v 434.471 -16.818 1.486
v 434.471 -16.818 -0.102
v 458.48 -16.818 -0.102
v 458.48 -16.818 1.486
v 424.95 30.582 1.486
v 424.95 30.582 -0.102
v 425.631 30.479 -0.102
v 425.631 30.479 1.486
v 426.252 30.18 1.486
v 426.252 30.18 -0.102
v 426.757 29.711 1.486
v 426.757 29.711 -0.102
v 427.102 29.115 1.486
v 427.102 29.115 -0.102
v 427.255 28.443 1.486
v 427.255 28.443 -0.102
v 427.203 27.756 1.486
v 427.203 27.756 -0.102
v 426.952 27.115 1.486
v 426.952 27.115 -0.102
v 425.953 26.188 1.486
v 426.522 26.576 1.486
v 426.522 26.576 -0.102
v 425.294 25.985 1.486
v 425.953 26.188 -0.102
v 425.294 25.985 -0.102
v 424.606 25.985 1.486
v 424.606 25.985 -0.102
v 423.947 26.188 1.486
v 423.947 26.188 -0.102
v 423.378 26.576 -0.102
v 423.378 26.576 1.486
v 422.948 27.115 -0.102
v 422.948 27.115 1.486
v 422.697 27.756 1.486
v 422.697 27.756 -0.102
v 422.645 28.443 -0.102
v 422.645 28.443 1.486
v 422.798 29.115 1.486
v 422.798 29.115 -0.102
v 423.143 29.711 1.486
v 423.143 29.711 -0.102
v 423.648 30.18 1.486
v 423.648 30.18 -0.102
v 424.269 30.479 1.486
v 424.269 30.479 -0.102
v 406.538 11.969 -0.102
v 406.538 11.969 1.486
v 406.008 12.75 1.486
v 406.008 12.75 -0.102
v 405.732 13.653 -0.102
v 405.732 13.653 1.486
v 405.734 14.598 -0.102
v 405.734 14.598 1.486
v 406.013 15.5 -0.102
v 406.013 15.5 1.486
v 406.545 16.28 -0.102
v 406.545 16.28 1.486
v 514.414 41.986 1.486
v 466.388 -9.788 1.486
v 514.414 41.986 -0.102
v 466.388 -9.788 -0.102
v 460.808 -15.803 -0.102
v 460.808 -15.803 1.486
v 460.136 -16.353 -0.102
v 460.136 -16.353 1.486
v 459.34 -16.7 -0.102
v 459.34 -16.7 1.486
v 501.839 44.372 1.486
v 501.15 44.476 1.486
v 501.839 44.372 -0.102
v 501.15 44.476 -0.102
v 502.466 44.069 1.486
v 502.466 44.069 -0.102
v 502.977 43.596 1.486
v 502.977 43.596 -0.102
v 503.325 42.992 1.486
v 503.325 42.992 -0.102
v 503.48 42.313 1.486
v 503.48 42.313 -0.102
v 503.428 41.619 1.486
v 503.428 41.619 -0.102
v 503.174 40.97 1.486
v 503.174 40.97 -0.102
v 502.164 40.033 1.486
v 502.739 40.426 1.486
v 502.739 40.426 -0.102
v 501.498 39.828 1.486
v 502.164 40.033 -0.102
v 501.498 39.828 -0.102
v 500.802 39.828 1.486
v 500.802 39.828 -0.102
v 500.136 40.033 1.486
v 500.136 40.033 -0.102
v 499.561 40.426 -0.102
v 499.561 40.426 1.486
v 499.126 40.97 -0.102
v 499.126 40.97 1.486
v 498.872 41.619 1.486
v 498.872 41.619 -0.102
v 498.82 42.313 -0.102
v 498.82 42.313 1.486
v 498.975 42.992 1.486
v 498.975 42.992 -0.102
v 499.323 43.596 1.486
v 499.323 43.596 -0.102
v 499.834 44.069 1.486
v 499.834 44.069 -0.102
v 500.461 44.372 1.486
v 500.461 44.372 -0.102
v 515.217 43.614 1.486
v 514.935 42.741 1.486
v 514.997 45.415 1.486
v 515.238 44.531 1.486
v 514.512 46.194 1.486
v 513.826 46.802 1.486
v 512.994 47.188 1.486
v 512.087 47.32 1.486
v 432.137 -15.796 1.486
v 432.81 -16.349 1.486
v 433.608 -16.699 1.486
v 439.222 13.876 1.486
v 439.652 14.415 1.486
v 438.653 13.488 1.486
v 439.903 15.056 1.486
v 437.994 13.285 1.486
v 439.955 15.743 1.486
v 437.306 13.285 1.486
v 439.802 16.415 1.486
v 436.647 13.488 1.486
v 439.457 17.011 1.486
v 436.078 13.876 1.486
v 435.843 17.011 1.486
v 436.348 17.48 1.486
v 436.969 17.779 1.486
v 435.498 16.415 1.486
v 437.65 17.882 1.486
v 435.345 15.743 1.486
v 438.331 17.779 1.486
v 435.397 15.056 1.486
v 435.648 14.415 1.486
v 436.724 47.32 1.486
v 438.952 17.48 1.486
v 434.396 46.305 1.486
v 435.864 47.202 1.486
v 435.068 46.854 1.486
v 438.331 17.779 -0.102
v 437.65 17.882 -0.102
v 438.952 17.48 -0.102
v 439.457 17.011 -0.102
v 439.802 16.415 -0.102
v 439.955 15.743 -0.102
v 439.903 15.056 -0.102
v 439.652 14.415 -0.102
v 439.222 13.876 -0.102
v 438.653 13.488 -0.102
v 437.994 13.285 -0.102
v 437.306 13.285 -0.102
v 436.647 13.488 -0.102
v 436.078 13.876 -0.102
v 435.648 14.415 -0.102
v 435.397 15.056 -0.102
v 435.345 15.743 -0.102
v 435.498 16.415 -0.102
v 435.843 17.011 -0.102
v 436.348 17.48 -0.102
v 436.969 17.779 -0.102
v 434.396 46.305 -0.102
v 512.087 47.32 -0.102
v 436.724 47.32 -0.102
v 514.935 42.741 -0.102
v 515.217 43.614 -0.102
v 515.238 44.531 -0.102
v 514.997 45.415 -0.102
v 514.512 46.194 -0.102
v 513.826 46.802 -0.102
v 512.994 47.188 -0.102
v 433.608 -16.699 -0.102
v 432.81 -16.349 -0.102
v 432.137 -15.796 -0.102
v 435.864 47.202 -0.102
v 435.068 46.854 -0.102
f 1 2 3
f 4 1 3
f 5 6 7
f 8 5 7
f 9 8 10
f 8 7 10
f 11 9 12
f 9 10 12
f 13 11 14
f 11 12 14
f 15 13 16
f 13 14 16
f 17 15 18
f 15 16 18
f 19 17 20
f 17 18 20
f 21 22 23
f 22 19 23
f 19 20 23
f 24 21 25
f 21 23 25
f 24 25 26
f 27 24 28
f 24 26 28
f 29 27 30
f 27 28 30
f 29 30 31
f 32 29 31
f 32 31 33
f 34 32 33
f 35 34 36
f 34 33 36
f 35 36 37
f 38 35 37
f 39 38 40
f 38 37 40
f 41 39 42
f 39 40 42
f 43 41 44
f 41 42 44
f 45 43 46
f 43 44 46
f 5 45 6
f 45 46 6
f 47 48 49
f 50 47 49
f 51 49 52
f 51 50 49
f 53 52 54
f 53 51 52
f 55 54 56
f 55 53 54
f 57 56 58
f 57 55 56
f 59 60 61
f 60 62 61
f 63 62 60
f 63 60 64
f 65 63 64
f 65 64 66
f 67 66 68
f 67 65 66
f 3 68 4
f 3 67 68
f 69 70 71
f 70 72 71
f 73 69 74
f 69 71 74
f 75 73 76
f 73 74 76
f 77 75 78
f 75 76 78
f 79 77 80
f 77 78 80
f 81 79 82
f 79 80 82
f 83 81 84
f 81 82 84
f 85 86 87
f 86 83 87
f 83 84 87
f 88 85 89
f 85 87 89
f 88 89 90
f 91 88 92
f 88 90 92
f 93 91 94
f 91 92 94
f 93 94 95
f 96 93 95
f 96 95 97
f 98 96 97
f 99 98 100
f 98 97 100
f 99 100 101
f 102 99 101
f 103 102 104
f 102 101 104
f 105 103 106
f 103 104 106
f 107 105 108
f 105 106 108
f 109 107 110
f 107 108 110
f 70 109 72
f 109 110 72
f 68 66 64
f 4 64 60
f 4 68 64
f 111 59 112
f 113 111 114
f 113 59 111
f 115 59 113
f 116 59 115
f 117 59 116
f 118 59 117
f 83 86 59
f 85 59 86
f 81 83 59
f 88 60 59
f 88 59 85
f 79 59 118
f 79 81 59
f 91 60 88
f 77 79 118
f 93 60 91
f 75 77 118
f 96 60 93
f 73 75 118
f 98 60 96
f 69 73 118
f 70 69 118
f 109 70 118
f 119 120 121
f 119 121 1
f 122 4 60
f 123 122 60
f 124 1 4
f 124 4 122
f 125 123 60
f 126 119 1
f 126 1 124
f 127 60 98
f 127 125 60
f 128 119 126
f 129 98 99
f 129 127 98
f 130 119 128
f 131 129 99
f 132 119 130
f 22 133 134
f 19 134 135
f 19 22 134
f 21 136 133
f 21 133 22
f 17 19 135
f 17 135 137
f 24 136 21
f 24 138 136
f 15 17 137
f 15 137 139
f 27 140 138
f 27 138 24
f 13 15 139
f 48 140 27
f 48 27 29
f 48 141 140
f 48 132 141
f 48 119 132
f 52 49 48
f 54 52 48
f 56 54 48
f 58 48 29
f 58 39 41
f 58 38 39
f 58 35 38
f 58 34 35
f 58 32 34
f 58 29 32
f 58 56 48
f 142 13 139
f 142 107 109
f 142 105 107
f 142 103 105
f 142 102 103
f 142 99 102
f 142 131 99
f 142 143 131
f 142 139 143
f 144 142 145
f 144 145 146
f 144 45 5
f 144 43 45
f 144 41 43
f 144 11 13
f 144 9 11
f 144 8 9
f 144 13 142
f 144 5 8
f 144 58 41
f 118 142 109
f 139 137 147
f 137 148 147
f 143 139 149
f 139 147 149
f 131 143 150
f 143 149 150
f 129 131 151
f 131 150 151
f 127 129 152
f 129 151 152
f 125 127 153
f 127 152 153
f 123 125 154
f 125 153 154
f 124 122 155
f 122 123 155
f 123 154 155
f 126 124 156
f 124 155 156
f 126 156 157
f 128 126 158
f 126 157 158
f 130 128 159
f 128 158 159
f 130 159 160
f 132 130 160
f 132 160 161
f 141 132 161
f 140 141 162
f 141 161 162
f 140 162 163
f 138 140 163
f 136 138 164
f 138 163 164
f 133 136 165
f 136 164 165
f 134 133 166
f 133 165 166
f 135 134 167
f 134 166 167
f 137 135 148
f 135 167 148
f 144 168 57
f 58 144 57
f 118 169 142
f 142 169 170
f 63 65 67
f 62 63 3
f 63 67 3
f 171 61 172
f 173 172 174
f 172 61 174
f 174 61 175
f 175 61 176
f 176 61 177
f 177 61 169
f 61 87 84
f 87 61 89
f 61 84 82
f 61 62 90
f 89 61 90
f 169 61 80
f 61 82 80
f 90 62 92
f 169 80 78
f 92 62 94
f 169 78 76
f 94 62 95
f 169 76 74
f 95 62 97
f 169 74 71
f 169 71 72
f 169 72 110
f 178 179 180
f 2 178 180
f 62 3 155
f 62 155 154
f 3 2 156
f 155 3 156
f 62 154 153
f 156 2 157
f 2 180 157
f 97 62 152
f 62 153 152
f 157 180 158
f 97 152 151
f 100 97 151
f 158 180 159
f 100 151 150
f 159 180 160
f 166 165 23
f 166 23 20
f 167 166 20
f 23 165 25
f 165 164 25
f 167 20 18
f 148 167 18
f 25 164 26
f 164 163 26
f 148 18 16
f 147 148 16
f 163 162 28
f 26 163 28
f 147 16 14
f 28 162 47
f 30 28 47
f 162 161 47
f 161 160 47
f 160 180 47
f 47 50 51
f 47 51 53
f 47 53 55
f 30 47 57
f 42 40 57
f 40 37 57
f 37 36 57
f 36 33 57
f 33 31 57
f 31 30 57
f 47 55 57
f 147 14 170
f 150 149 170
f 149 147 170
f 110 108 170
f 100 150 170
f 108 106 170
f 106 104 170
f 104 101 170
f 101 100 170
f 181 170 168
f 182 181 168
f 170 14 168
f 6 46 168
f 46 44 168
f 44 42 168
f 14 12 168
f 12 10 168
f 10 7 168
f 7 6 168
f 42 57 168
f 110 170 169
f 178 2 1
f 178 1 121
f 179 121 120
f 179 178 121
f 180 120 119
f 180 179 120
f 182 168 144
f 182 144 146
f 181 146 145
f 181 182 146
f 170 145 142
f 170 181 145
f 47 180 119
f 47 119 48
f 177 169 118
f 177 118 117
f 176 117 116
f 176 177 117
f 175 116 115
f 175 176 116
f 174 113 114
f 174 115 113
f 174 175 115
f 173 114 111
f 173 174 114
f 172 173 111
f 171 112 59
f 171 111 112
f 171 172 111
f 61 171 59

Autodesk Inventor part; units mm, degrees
ref_plane "YZ Plane" through (0, 0, 0) normal (1, 0, 0) x (0, 1, 0)
ref_plane "XZ Plane" through (0, 0, 0) normal (0, 1, 0) x (-1, 0, 0)
ref_plane "Work Plane1" through (456.7, 53.6703, -0.1016) normal (0, 0, 1) x (0, 1, 0)
sketch "Sketch1" plane through (456.7, 53.6703, -0.1016) normal (0, 0, 1) x (0, 1, 0)
  circle A0 centre (-38.1, 19.05) radius 2.3114 construction
  circle A1 centre (-38.1, 31.75) radius 2.3114 construction
  circle A2 centre (-38.1, 31.75) radius 47.625 construction
  line L0 (-85.725, 31.75) -> (-85.725, -73.025) construction
  line L1 (-85.725, -73.025) -> (-69.85, -73.025) construction
  circle A3 centre (-39.624, -73.025) radius 30.226 construction
  line L2 (-63.4579, -9.6878) -> (-11.6843, -57.7145)
  line L3 (-6.35, -55.3867) -> (-6.35, 19.9759)
  line L4 (-70.4888, 2.6423) -> (-70.4888, 9.8614)
  arc A4 (-11.6843, -57.7145) -> (-6.35, -55.3867) centre (-9.525, -55.3867) ccw
  line L5 (-63.4579, -9.6878) -> (-69.473, -4.1079)
  line L6 (-70.4888, 2.6423) -> (-70.4888, -1.7802)
  arc A5 (-70.4888, -1.7802) -> (-69.473, -4.1079) centre (-67.3138, -1.7802) ccw
  circle A6 centre (-25.4, 31.75) radius 2.3114 projected
  line L7 (-70.4888, -1.7802) -> (-70.4888, 22.2286)
  line L8 (-7.3657, 22.3036) -> (-37.3903, 50.1552)
  arc A7 (-6.35, 19.9759) -> (-7.3657, 22.3036) centre (-9.525, 19.9759) ccw
  line L9 (-69.466, 24.5628) -> (-41.7017, 50.1618)
  arc A8 (-37.3903, 50.1552) -> (-41.7017, 50.1618) centre (-39.5495, 47.8275) ccw
  arc A9 (-69.466, 24.5628) -> (-70.4888, 22.2286) centre (-67.3138, 22.2286) ccw
  circle A10 centre (-38.1, 19.05) radius 2.3114 projected
  circle A11 centre (-25.4, 19.05) radius 2.3114 projected
  circle A12 centre (-11.5316, -44.45) radius 2.3368
  circle A13 centre (-11.5316, -44.45) radius 2.1844 construction
  point P0 (-53.6703, 456.7)
  point P1 (-70.4888, -3.1657)
  point P2 (6.35, -48.768)
  point P3 (-6.35, 21.3614)
  point P4 (-19.05, 12.7)
  point P5 (-70.4888, 23.6198)
  dimension "d0" = 95.25
  dimension "d1" = 104.775
  dimension "d2" = 15.875
  dimension "d3" = 60.452
  dimension "d4" = 0
  dimension "d5" = 30.226
  dimension "d8" = 3.175
  dimension "d16" = 3.175
  dimension "d19" = 12.7
  dimension "d20" = 25.4
  dimension "d22" = 3.175
  dimension "d23" = 4.6736
  dimension "d26" = 63.5
  dimension "d29" = 0
extrude "Extrusion2" add sketch "Sketch1" along normal blind 1.5875 contours L5 A5 L6 L4 L7 A9 L9 A8 L8 A7 L3 A4 L2 | A11
properties part number "meow" material "Acetal Resin, White"
